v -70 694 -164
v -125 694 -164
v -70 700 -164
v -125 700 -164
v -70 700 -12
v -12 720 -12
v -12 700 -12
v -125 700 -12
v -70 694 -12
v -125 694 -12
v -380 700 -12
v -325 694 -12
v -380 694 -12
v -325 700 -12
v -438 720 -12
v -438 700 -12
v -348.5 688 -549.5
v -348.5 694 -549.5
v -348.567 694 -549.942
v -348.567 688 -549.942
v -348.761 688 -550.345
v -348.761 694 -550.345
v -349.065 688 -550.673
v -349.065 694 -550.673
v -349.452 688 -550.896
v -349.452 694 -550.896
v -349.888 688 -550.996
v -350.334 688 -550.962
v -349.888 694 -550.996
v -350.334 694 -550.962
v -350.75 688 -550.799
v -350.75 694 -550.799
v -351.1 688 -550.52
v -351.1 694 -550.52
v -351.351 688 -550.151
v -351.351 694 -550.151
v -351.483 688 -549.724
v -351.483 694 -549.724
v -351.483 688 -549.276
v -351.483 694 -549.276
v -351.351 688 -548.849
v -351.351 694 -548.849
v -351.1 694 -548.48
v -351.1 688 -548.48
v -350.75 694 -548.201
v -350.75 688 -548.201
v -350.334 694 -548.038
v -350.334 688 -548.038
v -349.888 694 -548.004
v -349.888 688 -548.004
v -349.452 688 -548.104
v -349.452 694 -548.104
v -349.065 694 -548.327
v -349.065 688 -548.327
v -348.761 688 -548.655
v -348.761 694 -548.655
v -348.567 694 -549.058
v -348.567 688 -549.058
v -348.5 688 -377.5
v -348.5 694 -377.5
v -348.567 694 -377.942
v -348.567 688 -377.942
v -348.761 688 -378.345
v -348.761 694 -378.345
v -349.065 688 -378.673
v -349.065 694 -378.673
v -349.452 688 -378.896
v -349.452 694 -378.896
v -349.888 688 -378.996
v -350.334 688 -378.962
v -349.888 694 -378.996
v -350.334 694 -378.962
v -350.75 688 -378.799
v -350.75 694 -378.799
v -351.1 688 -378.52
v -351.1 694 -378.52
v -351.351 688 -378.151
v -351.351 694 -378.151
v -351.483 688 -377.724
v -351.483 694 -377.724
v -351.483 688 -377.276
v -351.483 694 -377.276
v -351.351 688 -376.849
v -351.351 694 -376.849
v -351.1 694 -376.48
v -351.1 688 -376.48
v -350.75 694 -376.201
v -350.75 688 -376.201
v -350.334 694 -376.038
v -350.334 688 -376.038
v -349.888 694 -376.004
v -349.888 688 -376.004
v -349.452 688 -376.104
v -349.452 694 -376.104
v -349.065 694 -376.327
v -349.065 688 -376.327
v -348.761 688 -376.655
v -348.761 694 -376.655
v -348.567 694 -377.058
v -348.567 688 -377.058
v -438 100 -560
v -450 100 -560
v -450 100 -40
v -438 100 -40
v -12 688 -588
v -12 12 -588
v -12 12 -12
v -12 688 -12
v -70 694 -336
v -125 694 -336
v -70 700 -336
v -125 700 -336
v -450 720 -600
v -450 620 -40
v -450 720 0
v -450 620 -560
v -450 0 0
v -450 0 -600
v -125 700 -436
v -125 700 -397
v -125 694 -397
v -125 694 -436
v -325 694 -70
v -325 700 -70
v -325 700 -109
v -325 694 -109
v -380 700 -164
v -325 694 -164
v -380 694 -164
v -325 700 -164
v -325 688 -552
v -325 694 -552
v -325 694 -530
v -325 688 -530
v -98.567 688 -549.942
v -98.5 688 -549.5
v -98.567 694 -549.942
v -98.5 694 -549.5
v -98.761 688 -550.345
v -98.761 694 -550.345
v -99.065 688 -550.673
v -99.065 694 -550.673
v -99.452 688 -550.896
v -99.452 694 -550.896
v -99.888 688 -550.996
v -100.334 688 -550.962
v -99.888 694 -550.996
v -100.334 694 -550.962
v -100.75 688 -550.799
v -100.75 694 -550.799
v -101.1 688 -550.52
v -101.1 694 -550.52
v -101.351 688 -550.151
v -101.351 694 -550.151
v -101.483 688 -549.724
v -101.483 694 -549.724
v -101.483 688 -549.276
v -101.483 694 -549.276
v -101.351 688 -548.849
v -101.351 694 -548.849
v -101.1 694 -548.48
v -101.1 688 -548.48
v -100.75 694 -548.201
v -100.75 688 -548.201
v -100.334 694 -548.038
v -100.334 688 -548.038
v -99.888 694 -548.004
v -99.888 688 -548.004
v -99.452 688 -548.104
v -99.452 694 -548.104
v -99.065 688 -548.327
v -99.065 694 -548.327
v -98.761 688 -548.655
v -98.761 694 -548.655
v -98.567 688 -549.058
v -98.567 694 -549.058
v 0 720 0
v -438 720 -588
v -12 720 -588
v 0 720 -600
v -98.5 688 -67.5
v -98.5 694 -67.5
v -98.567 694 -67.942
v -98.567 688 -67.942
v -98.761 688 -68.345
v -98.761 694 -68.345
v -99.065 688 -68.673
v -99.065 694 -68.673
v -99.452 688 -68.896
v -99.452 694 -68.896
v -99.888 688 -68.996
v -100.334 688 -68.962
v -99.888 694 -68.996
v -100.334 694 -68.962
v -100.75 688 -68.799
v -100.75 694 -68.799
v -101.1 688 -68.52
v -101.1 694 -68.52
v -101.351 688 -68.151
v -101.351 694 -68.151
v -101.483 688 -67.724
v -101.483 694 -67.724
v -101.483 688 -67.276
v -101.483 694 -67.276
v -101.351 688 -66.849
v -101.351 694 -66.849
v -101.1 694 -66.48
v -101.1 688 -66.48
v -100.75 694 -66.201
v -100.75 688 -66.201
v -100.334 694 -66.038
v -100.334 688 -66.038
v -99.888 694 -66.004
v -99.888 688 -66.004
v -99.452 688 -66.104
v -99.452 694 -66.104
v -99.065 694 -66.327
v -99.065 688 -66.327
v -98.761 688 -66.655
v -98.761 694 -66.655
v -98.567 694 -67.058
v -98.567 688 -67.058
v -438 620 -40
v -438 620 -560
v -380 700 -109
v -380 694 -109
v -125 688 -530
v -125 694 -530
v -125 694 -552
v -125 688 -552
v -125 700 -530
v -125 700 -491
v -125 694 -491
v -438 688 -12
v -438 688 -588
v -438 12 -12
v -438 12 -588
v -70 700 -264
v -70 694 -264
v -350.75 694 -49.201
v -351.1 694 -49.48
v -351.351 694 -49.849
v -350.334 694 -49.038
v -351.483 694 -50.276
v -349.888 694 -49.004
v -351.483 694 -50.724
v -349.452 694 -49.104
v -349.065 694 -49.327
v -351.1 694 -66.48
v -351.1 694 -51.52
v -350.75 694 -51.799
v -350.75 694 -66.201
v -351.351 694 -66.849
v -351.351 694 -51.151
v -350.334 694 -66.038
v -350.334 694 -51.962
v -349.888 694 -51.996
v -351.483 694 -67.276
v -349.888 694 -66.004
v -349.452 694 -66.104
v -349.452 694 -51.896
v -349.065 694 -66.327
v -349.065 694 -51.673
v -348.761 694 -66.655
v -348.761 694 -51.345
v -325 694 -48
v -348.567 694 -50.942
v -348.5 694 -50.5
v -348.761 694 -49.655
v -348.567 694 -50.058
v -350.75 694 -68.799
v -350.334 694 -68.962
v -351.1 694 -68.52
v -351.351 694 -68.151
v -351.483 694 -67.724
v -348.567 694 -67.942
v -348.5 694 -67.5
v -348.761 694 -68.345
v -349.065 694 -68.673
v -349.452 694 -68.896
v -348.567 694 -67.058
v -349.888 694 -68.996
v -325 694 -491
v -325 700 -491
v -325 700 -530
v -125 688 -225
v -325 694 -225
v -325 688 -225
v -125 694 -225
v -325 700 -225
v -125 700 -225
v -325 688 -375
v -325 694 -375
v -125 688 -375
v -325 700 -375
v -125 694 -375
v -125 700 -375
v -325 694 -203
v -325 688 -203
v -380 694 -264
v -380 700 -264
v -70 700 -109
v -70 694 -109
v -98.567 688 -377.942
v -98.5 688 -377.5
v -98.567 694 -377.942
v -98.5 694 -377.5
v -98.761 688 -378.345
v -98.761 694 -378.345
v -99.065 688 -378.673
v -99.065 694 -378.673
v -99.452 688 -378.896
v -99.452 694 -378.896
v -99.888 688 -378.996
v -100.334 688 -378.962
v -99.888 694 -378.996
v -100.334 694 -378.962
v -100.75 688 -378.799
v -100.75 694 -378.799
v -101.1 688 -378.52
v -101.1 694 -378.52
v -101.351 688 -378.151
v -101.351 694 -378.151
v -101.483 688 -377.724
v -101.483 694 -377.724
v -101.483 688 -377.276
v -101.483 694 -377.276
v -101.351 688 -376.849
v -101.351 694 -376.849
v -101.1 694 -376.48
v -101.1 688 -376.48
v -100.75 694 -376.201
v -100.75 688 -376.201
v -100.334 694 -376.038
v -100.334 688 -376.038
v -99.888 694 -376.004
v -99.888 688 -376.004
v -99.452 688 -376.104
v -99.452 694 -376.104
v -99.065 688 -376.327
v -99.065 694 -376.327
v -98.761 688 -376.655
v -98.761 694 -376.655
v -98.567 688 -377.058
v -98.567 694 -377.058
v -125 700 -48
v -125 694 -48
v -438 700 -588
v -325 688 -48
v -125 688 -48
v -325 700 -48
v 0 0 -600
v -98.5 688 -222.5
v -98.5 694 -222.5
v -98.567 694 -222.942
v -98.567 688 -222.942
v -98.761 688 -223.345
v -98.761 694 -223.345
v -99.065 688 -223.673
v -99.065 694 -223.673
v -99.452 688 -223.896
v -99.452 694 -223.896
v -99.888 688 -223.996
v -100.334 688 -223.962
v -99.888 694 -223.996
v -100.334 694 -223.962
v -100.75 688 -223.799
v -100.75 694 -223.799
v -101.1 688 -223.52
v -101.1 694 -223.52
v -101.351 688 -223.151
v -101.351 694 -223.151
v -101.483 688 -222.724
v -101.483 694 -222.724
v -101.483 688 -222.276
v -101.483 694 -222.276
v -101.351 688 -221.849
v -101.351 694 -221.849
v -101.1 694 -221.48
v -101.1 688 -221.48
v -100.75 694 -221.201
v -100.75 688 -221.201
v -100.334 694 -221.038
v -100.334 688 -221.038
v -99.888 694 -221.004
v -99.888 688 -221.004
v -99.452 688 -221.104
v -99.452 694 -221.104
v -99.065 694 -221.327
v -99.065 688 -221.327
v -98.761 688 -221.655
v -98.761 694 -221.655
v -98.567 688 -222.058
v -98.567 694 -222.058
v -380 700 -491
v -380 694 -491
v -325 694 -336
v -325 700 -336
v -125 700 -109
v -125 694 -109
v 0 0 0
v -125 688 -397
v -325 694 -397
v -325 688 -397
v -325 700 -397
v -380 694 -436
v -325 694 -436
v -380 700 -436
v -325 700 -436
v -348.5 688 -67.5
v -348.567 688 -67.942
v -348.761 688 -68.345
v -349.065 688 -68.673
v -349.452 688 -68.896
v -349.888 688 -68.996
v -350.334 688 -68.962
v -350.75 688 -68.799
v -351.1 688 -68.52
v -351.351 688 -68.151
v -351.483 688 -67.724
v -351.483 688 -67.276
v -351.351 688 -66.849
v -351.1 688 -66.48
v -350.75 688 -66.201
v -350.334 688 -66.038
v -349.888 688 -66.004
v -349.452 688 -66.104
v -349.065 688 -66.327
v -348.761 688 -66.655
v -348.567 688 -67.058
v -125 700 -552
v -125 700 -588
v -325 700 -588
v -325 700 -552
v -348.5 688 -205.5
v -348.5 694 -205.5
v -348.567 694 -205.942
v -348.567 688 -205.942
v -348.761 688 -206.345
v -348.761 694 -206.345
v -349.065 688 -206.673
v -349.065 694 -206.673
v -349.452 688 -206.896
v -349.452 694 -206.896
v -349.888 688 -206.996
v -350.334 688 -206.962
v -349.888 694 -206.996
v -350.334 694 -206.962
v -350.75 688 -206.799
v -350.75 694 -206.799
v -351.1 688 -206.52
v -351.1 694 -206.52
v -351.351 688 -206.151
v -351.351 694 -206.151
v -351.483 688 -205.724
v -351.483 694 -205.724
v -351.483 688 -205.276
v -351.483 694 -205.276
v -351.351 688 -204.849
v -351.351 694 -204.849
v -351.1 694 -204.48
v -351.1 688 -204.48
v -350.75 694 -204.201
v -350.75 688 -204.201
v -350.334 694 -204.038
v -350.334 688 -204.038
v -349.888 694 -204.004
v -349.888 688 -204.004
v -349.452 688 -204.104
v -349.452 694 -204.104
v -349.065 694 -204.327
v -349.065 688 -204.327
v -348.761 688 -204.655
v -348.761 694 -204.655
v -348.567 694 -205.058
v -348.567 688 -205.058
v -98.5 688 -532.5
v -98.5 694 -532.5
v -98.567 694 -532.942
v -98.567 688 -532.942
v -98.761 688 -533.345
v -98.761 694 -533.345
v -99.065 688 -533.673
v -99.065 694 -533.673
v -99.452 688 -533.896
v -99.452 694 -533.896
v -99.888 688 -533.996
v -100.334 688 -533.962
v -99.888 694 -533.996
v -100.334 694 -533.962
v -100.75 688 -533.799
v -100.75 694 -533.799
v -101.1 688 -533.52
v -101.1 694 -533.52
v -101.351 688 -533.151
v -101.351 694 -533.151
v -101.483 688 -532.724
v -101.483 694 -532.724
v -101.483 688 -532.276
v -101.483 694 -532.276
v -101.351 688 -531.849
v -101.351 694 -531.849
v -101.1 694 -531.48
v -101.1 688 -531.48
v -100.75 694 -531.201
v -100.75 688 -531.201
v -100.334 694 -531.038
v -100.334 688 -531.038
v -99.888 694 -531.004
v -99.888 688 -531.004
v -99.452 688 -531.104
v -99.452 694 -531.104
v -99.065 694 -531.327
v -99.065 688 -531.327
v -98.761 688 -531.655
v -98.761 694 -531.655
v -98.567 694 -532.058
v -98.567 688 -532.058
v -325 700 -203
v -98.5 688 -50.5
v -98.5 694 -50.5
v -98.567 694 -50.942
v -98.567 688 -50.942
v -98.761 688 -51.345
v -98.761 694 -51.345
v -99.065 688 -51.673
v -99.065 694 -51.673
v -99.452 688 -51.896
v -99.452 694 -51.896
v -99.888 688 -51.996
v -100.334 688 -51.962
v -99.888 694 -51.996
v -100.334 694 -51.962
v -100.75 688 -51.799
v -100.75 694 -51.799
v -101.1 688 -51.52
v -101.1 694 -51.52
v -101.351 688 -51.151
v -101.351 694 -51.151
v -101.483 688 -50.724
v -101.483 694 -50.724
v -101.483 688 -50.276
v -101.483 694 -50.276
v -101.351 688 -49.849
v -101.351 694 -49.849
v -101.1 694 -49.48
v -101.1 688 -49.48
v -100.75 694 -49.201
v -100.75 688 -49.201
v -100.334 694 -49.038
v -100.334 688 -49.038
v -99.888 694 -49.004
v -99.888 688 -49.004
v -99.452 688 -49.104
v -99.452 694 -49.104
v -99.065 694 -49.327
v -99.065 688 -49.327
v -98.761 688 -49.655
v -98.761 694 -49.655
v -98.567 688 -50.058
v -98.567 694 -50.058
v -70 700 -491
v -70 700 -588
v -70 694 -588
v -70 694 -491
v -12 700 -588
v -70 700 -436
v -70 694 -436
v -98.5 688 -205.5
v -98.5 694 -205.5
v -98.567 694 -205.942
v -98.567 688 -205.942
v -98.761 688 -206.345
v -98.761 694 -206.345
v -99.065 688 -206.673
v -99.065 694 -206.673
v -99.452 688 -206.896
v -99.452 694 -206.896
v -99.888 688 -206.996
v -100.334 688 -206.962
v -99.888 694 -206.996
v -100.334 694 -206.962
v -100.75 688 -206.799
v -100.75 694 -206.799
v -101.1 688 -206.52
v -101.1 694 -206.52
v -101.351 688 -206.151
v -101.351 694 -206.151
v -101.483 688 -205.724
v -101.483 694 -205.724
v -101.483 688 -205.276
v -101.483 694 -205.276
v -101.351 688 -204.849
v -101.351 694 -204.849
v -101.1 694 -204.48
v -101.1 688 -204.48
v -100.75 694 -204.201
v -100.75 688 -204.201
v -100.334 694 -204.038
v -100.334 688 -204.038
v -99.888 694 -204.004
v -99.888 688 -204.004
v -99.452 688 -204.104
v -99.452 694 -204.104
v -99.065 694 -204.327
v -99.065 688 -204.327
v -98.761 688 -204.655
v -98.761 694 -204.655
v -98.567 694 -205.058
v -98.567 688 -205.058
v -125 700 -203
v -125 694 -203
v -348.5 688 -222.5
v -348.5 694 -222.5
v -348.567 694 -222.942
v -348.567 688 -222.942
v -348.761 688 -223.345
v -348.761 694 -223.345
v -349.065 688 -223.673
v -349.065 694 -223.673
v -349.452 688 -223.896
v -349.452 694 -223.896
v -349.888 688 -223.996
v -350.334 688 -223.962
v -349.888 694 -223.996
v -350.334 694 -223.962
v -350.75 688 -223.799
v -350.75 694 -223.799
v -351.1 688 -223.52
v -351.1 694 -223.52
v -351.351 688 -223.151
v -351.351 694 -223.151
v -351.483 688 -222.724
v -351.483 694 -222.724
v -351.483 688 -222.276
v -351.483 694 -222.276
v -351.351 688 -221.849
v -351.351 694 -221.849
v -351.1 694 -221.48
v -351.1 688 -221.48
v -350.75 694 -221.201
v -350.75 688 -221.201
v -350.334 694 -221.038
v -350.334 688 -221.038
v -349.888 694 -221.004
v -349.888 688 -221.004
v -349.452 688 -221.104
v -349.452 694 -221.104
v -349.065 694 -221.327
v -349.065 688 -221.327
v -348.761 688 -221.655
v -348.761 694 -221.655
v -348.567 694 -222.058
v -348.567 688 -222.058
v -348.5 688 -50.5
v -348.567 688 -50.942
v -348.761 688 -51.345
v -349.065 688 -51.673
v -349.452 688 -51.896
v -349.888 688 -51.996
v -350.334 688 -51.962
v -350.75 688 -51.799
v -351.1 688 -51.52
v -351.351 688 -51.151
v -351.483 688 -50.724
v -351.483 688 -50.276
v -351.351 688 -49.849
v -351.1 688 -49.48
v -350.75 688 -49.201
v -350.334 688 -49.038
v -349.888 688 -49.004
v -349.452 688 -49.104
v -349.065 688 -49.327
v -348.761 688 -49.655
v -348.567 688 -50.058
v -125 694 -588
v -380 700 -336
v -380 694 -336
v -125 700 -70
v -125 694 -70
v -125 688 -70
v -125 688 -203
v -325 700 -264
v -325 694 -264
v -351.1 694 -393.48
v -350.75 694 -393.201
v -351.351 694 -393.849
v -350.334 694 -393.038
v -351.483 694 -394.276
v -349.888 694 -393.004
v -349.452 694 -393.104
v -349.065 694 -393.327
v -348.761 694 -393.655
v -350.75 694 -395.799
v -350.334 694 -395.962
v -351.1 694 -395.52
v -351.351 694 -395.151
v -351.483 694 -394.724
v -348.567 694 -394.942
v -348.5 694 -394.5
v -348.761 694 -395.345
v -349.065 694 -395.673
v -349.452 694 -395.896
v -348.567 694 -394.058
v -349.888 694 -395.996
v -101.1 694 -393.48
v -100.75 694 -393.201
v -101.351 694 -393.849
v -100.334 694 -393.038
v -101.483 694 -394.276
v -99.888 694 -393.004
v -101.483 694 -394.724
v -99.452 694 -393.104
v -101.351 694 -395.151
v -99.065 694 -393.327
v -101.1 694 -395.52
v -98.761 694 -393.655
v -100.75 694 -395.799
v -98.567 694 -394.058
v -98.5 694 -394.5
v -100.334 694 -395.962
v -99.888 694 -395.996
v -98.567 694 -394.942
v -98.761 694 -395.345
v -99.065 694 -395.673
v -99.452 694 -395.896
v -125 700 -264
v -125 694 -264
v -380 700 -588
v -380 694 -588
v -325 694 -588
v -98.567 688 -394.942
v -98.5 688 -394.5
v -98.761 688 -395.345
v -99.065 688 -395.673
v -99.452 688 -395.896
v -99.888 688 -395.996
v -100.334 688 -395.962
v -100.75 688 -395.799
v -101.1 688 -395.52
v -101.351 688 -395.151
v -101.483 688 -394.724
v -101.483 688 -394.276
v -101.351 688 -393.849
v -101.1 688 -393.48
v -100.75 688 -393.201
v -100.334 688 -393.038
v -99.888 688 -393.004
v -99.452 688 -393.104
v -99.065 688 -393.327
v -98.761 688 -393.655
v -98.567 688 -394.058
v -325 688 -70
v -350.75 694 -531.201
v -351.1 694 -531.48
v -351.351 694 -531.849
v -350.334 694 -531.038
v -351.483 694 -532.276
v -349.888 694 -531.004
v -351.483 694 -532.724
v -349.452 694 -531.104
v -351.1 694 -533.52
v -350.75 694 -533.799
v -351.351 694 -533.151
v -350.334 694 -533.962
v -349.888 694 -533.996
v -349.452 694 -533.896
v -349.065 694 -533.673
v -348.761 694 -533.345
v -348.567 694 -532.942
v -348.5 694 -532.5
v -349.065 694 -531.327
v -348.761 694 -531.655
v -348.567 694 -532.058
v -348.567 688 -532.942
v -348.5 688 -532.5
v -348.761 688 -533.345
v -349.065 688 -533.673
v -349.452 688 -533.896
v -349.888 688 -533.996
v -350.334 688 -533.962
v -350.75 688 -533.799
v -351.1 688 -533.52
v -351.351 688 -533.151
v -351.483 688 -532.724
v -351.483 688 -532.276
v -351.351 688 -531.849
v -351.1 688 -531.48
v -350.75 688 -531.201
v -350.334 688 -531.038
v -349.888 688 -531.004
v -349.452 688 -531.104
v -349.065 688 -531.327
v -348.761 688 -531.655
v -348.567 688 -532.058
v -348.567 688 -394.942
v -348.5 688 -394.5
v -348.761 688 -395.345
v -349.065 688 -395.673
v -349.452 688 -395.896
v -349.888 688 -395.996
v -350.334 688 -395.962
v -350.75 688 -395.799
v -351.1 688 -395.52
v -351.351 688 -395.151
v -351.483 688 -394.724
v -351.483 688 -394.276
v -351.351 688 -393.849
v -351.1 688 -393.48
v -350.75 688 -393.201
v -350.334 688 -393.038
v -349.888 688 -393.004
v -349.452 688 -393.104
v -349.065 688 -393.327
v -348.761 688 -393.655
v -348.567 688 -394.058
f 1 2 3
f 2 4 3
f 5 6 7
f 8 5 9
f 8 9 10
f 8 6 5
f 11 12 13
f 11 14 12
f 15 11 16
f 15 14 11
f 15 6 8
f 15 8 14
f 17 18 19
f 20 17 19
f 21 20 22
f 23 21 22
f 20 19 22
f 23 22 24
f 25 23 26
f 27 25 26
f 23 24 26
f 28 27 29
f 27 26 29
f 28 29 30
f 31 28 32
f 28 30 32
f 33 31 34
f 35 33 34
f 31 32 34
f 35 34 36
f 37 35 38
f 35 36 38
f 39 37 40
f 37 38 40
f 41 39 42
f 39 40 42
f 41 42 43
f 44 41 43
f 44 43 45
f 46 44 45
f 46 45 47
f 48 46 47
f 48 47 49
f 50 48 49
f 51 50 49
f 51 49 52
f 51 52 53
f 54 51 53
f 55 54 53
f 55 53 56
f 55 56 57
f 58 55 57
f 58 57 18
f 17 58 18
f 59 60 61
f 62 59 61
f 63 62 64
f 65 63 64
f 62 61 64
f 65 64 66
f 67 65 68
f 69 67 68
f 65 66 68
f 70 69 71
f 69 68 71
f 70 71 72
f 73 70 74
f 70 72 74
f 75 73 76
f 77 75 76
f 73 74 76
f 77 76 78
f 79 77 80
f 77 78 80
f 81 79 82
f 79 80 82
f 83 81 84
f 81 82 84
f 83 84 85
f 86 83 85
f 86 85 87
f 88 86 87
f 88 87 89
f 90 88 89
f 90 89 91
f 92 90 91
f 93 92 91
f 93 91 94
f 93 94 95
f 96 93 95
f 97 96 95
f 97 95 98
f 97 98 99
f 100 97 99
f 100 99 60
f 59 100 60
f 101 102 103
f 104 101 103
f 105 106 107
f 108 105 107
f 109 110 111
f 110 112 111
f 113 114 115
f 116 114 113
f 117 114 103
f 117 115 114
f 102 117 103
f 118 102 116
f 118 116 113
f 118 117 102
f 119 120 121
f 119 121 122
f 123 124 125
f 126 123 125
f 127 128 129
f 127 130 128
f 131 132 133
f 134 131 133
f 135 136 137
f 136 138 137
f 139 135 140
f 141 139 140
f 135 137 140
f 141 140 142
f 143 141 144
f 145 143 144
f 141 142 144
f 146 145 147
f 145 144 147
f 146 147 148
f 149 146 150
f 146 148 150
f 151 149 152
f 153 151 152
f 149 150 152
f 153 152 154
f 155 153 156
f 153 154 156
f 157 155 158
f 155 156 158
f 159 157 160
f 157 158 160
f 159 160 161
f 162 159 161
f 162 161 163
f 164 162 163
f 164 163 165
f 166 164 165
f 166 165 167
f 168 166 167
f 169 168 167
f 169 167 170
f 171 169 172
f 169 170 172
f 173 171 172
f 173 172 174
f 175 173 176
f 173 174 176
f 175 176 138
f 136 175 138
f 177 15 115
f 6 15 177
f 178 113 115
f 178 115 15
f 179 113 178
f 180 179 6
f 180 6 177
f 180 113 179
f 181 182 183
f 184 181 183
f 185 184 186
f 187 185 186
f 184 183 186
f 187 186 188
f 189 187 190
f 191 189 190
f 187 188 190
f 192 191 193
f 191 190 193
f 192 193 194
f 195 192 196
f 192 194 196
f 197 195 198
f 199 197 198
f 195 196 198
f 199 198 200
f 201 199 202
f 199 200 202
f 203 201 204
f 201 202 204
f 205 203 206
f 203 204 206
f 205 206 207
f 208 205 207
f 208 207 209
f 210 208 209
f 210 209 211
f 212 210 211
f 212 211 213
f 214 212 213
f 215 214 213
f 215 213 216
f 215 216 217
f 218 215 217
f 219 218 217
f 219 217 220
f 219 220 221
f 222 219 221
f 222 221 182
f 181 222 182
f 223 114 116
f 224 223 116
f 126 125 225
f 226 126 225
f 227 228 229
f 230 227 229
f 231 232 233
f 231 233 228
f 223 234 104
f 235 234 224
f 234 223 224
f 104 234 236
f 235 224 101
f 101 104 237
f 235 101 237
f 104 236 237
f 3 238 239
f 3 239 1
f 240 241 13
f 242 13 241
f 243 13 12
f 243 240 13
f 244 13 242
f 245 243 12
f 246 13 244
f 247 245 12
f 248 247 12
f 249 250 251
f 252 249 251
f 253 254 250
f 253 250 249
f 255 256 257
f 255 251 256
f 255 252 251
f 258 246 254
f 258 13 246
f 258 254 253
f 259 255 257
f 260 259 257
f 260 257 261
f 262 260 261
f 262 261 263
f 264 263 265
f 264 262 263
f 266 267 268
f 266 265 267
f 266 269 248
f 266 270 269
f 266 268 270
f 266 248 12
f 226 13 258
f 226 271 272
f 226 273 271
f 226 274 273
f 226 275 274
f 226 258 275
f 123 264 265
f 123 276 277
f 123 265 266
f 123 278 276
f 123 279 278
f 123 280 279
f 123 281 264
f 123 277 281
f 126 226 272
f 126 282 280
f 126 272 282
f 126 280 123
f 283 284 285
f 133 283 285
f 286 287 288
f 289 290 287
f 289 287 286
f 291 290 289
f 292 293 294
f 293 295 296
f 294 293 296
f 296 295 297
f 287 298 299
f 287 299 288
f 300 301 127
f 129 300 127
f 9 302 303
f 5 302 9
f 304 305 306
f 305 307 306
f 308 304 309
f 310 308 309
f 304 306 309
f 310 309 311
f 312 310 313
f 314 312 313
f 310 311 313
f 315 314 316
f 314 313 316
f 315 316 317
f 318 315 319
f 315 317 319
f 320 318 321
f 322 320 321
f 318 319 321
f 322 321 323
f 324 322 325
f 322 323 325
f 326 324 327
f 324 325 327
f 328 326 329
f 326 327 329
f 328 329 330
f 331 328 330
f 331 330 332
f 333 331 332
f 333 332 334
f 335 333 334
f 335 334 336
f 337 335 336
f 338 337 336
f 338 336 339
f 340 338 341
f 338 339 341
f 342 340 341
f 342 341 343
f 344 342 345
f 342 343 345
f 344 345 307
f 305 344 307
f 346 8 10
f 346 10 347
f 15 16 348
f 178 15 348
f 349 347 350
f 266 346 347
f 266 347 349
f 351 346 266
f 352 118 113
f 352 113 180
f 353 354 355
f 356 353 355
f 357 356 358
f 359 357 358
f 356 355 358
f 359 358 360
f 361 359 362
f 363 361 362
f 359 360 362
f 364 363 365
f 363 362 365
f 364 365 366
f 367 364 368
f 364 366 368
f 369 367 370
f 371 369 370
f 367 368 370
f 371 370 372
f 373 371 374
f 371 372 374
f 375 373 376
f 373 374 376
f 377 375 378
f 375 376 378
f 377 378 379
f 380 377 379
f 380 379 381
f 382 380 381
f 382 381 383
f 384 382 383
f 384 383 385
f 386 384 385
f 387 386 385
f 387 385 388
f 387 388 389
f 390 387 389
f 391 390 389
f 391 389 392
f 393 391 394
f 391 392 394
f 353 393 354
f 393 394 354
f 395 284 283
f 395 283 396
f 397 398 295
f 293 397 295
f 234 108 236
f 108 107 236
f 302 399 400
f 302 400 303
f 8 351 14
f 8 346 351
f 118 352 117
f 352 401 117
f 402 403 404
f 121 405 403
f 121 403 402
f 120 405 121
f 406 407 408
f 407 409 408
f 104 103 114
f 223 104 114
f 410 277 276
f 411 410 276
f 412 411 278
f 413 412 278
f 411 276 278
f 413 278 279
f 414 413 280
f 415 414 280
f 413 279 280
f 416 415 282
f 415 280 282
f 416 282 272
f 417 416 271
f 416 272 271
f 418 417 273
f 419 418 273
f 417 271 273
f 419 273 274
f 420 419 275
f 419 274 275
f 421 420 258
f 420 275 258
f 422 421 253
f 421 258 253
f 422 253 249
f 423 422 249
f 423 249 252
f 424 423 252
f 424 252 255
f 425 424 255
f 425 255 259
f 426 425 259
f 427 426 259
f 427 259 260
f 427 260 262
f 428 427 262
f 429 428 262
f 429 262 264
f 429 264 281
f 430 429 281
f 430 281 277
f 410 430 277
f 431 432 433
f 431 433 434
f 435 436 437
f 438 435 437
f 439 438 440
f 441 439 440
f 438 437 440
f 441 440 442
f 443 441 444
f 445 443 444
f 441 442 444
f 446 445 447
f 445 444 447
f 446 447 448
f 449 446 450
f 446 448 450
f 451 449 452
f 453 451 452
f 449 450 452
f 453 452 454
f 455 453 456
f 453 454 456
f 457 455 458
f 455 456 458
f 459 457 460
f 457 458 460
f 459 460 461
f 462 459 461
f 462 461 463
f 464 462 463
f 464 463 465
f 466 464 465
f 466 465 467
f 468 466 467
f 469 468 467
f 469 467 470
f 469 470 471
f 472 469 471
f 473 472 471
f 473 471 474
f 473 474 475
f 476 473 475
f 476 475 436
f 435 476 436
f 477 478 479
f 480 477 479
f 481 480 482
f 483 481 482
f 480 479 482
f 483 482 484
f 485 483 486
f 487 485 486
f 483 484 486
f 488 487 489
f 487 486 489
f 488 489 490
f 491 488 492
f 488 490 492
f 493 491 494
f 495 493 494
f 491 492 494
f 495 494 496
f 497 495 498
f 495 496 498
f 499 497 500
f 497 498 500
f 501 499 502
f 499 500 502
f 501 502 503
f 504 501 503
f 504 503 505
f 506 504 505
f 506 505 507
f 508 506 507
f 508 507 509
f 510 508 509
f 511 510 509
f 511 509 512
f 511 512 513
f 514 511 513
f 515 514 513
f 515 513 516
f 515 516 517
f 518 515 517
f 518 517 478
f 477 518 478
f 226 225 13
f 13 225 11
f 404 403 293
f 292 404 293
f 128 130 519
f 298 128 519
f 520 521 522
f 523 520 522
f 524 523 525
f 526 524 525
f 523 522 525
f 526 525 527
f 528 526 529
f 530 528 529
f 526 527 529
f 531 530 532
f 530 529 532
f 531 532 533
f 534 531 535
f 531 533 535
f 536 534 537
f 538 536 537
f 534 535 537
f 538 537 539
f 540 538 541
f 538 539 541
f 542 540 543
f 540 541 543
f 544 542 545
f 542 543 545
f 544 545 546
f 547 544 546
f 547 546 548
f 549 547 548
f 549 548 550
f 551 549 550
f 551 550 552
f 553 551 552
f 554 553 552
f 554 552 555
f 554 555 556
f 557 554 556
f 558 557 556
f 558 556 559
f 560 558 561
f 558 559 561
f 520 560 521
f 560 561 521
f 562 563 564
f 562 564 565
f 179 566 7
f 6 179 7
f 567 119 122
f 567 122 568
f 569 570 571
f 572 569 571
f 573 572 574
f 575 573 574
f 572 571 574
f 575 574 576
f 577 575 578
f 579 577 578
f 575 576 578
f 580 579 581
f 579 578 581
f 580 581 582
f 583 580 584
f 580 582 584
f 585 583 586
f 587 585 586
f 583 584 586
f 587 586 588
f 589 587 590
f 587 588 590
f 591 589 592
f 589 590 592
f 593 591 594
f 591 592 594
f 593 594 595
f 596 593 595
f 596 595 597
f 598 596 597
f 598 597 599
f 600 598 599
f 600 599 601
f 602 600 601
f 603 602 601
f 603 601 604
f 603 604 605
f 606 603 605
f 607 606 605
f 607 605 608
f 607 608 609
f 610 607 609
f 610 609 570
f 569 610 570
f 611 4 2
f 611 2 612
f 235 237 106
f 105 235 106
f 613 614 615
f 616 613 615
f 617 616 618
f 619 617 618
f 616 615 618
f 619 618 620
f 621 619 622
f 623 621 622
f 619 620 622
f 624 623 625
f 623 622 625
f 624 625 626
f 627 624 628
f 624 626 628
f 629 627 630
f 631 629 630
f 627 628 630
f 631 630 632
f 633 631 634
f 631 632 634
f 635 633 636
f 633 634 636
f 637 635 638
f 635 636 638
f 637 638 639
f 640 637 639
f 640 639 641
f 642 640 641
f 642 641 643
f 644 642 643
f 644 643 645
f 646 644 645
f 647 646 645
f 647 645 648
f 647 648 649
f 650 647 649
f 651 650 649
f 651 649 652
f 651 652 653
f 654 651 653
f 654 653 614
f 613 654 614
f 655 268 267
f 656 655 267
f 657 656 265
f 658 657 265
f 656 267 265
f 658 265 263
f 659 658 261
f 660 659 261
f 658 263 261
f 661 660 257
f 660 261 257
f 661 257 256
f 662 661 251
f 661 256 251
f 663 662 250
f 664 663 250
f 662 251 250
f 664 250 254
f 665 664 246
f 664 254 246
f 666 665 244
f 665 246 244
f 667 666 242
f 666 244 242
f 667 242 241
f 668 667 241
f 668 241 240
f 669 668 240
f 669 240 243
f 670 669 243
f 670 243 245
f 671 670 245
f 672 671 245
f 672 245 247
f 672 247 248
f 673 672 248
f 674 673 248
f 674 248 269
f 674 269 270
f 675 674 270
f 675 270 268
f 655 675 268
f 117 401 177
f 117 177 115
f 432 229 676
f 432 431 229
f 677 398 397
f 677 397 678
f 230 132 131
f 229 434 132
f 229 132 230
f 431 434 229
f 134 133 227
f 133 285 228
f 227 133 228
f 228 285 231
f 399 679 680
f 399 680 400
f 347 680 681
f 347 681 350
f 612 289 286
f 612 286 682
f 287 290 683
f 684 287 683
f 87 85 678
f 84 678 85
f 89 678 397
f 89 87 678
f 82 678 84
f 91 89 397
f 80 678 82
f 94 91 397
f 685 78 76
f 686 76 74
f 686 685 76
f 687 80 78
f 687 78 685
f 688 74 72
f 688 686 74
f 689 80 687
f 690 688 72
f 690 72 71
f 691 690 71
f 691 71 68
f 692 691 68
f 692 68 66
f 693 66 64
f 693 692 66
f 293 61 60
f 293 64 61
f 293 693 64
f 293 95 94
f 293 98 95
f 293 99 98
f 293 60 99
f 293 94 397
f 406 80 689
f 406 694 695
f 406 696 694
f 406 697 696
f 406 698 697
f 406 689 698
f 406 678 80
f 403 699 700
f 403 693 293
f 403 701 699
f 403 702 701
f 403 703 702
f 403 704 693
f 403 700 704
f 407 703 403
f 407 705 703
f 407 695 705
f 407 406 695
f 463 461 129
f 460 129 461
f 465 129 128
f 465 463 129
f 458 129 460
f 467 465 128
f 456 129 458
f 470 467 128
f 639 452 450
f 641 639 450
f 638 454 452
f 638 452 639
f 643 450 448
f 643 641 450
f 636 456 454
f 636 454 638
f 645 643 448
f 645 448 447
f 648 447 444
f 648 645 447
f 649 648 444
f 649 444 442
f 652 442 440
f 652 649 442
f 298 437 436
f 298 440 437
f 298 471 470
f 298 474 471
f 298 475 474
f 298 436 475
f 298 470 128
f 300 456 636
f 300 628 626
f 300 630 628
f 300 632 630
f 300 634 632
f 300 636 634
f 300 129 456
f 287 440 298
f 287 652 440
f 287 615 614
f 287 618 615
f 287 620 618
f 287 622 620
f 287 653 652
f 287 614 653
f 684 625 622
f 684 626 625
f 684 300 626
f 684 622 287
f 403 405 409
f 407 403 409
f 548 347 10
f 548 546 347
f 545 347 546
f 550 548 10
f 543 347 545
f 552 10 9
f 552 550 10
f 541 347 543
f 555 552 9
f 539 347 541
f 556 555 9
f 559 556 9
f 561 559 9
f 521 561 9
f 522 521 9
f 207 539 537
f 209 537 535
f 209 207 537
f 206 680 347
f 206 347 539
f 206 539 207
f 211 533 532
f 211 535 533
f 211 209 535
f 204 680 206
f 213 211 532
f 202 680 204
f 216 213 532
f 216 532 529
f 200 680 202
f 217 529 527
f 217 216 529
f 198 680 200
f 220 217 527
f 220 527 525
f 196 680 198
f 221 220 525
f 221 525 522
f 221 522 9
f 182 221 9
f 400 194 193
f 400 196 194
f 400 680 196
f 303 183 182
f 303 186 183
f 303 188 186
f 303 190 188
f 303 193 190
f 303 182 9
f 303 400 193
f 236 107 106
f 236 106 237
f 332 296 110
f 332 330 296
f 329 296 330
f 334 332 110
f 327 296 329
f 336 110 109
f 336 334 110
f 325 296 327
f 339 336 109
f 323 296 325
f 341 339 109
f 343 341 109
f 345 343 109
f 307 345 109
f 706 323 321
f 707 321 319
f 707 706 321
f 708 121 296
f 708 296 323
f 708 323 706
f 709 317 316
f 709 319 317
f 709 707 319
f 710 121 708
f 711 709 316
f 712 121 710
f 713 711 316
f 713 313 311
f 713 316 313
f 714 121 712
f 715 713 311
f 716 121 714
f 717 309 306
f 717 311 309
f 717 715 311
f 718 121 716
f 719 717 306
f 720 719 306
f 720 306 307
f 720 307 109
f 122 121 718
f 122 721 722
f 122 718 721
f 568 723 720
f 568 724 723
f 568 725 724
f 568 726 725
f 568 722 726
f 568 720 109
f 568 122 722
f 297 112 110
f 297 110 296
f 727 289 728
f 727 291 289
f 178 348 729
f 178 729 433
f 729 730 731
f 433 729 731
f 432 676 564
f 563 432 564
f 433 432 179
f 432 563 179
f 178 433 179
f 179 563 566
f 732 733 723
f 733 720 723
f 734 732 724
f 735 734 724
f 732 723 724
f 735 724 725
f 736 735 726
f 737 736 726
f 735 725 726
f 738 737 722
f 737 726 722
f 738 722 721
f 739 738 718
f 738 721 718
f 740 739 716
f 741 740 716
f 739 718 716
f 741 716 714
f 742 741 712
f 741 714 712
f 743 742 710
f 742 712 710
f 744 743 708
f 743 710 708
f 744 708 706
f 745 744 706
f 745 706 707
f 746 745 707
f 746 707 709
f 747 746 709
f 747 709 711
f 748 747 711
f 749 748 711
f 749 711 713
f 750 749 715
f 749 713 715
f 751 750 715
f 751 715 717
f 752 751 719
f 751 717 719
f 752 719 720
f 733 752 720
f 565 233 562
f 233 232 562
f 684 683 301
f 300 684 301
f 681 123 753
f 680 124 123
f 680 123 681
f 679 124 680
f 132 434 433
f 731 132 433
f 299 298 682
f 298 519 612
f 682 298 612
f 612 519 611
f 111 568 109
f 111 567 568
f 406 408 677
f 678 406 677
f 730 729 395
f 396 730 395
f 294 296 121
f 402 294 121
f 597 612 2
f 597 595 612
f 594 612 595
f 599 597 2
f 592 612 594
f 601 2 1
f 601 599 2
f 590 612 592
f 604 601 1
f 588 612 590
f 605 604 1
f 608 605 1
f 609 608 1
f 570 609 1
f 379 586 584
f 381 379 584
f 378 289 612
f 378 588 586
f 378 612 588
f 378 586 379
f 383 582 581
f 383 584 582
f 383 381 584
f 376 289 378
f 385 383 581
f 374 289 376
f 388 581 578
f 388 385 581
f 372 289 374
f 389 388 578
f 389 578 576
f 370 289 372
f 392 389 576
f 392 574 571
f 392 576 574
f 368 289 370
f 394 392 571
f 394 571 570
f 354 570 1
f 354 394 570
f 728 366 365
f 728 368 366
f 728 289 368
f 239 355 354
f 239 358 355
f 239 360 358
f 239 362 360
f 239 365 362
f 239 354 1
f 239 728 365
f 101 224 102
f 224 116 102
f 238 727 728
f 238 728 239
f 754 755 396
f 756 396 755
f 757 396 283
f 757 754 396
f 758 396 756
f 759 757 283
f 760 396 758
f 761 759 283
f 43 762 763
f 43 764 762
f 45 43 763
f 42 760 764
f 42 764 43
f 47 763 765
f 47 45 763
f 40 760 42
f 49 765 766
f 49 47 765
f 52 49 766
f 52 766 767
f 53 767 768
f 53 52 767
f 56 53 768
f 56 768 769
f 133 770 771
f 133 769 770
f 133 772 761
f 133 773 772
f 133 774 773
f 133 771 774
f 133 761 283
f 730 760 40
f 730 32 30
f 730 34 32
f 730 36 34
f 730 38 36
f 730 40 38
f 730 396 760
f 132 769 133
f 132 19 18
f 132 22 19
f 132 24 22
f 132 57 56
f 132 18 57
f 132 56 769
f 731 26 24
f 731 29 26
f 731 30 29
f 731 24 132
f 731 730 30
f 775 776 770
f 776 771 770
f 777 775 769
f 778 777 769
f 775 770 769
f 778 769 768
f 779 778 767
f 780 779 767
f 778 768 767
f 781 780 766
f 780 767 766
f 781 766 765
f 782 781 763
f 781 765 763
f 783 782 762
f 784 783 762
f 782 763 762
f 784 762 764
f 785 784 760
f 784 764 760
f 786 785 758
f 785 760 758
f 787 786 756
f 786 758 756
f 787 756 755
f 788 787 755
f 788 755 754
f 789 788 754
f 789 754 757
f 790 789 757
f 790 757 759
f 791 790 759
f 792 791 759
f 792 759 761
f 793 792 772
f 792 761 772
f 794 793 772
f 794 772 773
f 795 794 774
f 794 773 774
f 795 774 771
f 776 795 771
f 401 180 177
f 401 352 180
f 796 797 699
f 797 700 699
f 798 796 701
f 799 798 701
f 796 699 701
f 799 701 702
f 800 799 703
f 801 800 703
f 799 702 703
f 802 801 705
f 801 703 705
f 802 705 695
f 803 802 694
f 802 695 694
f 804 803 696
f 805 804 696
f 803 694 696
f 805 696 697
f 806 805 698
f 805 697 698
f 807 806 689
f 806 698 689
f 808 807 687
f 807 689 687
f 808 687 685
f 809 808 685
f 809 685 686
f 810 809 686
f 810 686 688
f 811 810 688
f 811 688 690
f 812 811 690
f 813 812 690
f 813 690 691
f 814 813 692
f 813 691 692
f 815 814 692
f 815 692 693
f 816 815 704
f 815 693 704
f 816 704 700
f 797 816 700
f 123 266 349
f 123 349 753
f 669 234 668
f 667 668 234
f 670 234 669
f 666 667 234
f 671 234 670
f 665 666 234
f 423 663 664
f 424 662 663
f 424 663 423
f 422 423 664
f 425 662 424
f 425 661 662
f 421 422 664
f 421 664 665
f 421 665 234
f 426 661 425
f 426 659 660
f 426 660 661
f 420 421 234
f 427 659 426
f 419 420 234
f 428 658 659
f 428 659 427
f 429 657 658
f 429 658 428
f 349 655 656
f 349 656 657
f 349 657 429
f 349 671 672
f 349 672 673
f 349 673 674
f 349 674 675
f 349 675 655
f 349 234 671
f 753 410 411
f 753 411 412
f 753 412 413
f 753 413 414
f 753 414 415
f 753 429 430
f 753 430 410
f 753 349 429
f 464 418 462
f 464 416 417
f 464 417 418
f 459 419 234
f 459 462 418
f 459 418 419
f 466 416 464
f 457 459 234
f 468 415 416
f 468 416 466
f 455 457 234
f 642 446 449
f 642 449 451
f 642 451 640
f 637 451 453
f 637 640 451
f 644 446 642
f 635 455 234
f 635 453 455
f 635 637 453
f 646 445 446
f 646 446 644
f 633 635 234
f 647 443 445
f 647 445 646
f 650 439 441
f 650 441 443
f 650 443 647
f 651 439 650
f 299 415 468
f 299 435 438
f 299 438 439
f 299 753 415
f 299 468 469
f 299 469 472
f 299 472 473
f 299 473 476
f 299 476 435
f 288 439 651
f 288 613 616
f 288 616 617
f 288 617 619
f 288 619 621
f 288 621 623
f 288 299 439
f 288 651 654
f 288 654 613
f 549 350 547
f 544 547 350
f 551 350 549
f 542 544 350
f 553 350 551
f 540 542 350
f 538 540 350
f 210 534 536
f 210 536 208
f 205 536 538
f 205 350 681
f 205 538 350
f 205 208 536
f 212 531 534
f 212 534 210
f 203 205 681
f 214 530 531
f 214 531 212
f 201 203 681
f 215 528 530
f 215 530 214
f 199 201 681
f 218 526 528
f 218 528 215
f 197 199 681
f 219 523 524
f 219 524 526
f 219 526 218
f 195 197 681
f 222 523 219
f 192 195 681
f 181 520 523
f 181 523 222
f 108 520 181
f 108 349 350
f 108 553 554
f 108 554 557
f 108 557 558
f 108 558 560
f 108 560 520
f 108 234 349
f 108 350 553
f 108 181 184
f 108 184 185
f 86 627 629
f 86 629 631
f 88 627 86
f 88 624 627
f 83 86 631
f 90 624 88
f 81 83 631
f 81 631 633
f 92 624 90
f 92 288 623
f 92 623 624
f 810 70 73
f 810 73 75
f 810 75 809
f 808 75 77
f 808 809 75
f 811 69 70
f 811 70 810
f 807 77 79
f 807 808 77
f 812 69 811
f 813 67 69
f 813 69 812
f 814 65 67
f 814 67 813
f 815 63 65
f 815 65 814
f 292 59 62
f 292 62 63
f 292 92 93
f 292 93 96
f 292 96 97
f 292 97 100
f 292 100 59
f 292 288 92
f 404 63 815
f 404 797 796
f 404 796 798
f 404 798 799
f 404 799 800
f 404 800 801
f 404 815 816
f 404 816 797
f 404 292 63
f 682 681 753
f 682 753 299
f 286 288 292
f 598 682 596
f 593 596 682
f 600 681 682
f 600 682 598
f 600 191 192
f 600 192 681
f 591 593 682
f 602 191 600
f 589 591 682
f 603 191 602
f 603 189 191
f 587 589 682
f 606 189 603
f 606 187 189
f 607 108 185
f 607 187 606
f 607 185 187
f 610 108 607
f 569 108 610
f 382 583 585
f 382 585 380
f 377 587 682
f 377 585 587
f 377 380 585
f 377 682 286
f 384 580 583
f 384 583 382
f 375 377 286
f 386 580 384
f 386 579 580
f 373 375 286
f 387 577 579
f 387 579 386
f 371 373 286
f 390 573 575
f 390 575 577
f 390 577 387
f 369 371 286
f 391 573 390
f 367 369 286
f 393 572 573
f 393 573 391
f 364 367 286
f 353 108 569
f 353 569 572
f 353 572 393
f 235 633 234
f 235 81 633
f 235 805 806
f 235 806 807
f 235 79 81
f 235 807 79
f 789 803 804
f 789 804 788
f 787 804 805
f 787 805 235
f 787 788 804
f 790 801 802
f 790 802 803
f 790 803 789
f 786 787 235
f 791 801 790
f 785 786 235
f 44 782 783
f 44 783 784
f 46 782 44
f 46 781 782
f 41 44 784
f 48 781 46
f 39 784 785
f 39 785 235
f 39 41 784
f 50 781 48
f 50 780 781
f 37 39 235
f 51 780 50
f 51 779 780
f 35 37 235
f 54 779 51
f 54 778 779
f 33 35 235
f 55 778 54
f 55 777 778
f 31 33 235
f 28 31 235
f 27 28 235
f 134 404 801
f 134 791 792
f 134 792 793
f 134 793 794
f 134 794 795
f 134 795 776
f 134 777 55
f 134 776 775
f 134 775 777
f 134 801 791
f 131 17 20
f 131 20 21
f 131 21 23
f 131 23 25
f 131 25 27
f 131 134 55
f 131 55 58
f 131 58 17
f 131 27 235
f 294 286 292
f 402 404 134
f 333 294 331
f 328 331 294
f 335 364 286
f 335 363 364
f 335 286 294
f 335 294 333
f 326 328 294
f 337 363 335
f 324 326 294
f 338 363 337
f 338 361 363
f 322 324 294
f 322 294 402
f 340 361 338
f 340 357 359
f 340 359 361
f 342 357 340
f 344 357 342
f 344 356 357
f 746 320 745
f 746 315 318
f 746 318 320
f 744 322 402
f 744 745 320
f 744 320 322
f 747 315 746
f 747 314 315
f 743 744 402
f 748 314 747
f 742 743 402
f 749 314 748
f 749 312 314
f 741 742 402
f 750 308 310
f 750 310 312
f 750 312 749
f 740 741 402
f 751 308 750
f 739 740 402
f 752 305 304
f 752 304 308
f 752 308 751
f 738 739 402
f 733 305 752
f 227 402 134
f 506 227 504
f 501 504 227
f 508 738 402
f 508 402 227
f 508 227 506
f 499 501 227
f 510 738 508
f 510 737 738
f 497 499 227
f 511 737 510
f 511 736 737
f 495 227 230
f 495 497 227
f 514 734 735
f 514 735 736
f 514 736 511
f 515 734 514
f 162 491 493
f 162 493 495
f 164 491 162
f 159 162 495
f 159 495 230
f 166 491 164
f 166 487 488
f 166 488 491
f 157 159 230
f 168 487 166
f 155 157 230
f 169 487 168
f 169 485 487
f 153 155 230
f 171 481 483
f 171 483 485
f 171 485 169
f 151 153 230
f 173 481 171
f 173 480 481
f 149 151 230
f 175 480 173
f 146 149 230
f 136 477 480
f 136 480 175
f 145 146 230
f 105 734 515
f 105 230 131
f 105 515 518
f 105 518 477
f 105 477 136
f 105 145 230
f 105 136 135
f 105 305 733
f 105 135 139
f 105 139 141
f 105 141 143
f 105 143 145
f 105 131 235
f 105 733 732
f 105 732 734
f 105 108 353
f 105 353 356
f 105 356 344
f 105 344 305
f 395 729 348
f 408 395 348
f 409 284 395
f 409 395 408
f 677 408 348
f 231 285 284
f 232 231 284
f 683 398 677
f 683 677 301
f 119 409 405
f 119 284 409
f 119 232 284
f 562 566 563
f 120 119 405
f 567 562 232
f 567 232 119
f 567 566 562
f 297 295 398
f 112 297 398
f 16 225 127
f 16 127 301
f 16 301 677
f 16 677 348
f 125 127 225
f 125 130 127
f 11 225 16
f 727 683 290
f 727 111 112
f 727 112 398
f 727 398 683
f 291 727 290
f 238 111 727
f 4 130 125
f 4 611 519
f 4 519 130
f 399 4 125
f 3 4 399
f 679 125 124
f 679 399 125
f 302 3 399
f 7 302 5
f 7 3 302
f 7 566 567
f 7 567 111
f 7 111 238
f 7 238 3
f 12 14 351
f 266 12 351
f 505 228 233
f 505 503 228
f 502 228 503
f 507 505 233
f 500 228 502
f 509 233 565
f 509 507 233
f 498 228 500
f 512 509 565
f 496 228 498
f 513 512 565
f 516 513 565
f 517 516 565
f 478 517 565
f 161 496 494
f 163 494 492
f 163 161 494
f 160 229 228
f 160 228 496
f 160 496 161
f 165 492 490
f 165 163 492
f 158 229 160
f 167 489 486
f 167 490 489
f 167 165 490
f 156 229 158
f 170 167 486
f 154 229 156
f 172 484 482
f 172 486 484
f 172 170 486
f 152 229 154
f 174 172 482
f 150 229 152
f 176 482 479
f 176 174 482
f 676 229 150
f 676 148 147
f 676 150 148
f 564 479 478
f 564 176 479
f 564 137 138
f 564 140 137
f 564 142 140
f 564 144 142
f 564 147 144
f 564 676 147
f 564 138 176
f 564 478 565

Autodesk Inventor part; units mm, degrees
ref_plane "YZ Plane" through (0, 0, 0) normal (1, 0, 0) x (0, 1, 0)
ref_plane "XZ Plane" through (0, 0, 0) normal (0, 1, 0) x (-1, 0, 0)
ref_plane "XY Plane" through (0, 0, 0) normal (0, 0, 1) x (1, 0, 0)
sketch "Sketch1" plane through (0, 0, 0) normal (0, 1, 0) x (-1, 0, 0)
  line L0 (0, 0) -> (450, 0)
  line L1 (450, 0) -> (450, -600)
  line L2 (450, -600) -> (0, -600)
  line L3 (0, -600) -> (0, 0)
  dimension "d0" = 450
  dimension "d1" = 600
extrude "Extrusion1" add sketch "Sketch1" along normal blind 12
sketch "Sketch2" plane through (0, 12, 0) normal (0, 1, 0) x (1, 0, 0)
  line L0 (0, 0) -> (0, 600) projected
  line L1 (-450, 600) -> (-450, 0) projected
  line L2 (0, 600) -> (-450, 600)
  line L3 (-450, 600) -> (-450, 0)
  line L4 (-450, 0) -> (0, 0)
  line L5 (0, 0) -> (0, 600)
  line L6 (-438, 588) -> (-12, 588)
  line L7 (-12, 588) -> (-12, 12)
  line L8 (-12, 12) -> (-438, 12)
  line L9 (-438, 12) -> (-438, 588)
  dimension "d4" = 12
extrude "Extrusion2" add sketch "Sketch2" along normal blind 708
sketch "Sketch3" plane through (-450, 0, -600) normal (-1, 0, 0) x (0, 0, 1)
  line L0 (0, 0) -> (40, 0)
  line L1 (40, 0) -> (40, 100)
  line L2 (40, 100) -> (0, 100)
  line L3 (0, 100) -> (0, 0)
  line L4 (600, 0) -> (560, 0)
  line L5 (560, 0) -> (560, 100)
  line L6 (560, 100) -> (600, 100)
  line L7 (600, 100) -> (600, 0)
  line L8 (600, 720) -> (560, 720)
  line L9 (560, 720) -> (560, 620)
  line L10 (560, 620) -> (600, 620)
  line L11 (600, 620) -> (600, 720)
  line L12 (40, 100) -> (560, 100)
  line L13 (560, 100) -> (560, 620)
  line L14 (560, 620) -> (40, 620)
  line L15 (40, 620) -> (40, 100)
  dimension "d7" = 40
  dimension "d8" = 100
  dimension "d9" = 40
  dimension "d10" = 100
  dimension "d11" = 40
  dimension "d12" = 100
extrude "Extrusion3" cut sketch "Sketch3" against normal blind 12 contours L15 L14 L13 L12
sketch "Sketch4" plane through (-12, 12, -588) normal (-1, 0, 0) x (0, 0, 1)
  point P0 (588, -12)
sketch "Sketch5" plane through (-12, 12, -588) normal (-1, 0, 0) x (0, 0, 1)
  line L0 (0, 0) -> (0, 708) projected
  line L1 (0, 708) -> (0, 688)
  line L2 (576, 0) -> (576, 708) projected
  line L3 (0, 688) -> (576, 688)
  line L4 (576, 688) -> (576, 676)
  line L5 (576, 676) -> (0, 676)
  line L6 (0, 676) -> (0, 688)
  point P0 (588, -12)
  dimension "d15" = 20
  dimension "d16" = 12
extrude "Extrusion4" add sketch "Sketch5" along normal up to surface (438 mm away)
sketch "Sketch6" plane through (-12, 700, -12) normal (0, 1, 0) x (1, 0, 0)
  line L0 (-426, 576) -> (0, 576) projected
  line L1 (-213, 576) -> (-213, 0)
  line L2 (0, 0) -> (-426, 0) projected
  line L3 (-213, 576) -> (-213, 504)
  line L4 (-213, 504) -> (-213, 515)
  line L5 (-213, 515) -> (-113, 515)
  line L6 (-213, 540) -> (-113, 540)
  line L7 (-113, 540) -> (-313, 540)
  line L8 (-313, 540) -> (-313, 518)
  line L9 (-313, 518) -> (-113, 518)
  line L10 (-113, 518) -> (-113, 540)
  line L11 (-213, 529) -> (-338, 529)
  line L12 (-338, 529) -> (-338, 537.5)
  circle A0 centre (-338, 537.5) radius 1.5
  line L13 (-338, 537.5) -> (-338, 520.5)
  circle A1 centre (-338, 520.5) radius 1.5
  circle A2 centre (-88, 537.5) radius 1.5
  circle A3 centre (-88, 520.5) radius 1.5
  line L14 (-213, 518) -> (-213, 374)
  line L15 (-213, 374) -> (-213, 385)
  line L16 (-213, 385) -> (-113, 385)
  line L17 (-113, 385) -> (-313, 385)
  line L18 (-313, 385) -> (-313, 363)
  line L19 (-313, 363) -> (-113, 363)
  line L20 (-113, 363) -> (-113, 385)
  line L21 (-88, 537.5) -> (-88, 520.5)
  line L22 (-113, 374) -> (-88, 374)
  line L23 (-88, 374) -> (-88, 382.5)
  line L24 (-88, 382.5) -> (-88, 365.5)
  circle A4 centre (-88, 382.5) radius 1.5
  circle A5 centre (-88, 365.5) radius 1.5
  circle A6 centre (-338, 382.5) radius 1.5
  circle A7 centre (-338, 365.5) radius 1.5
  line L25 (-213, 288) -> (-149.1067, 288)
  line L26 (-113, 36) -> (-313, 36)
  line L27 (-313, 36) -> (-313, 58)
  line L28 (-313, 58) -> (-113, 58)
  line L29 (-113, 58) -> (-113, 36)
  circle A8 centre (-338, 38.5) radius 1.5
  circle A9 centre (-338, 55.5) radius 1.5
  circle A10 centre (-88, 38.5) radius 1.5
  circle A11 centre (-88, 55.5) radius 1.5
  line L30 (-213, 191) -> (-113, 191)
  line L31 (-113, 191) -> (-313, 191)
  line L32 (-313, 191) -> (-313, 213)
  line L33 (-313, 213) -> (-113, 213)
  line L34 (-113, 213) -> (-113, 191)
  circle A12 centre (-88, 193.5) radius 1.5
  circle A13 centre (-88, 210.5) radius 1.5
  circle A14 centre (-338, 193.5) radius 1.5
  circle A15 centre (-338, 210.5) radius 1.5
  point P0 (12, -12)
  point P1 (-113, 202)
  dimension "d19" = 72
  dimension "d20" = 11
  dimension "d21" = 100
  dimension "d22" = 200
  dimension "d23" = 22
  dimension "d24" = 125
  dimension "d25" = 8.5
  dimension "d26" = 3
  dimension "d27" = 17
  dimension "d28" = 3
  dimension "d29" = 144
  dimension "d30" = 11
  dimension "d31" = 100
  dimension "d32" = 22
  dimension "d33" = 25
  dimension "d34" = 8.5
  dimension "d35" = 17
extrude "Extrusion5" cut sketch "Sketch6" against normal blind 12
sketch "Sketch7" plane through (-12, 700, -12) normal (0, 1, 0) x (1, 0, 0)
  point P0 (12, -12)
sketch "Sketch8" plane through (-12, 700, -12) normal (0, 1, 0) x (1, 0, 0)
  line L0 (-313, 36) -> (-113, 36) projected
  line L1 (0, 0) -> (-426, 0) projected
  line L2 (-113, 36) -> (-58, 36)
  line L3 (-58, 36) -> (-58, 0)
  line L4 (-58, 0) -> (-113, 0)
  line L5 (-113, 0) -> (-113, 36)
  line L6 (0, 576) -> (-426, 576) projected
  line L7 (-58, 0) -> (-113, 0)
  line L8 (-113, 0) -> (-113, 576)
  line L9 (-113, 576) -> (-58, 576)
  line L10 (-58, 576) -> (-58, 0)
  line L11 (-213, 576) -> (-213, 492.9695)
  line L12 (-426, 0) -> (0, 0)
  line L13 (-368, 0) -> (-313, 0)
  line L14 (-426, 576) -> (0, 576)
  line L15 (-313, 0) -> (-313, 576)
  line L16 (-313, 576) -> (-368, 576)
  line L17 (-368, 576) -> (-368, 0)
  line L18 (-313, 518) -> (-113, 518) projected
  line L19 (-313, 540) -> (-113, 540) projected
  line L20 (-313, 518) -> (-313, 540)
  line L21 (-113, 213) -> (-313, 213) projected
  line L22 (-313, 191) -> (-113, 191) projected
  line L23 (-313, 213) -> (-313, 191)
  line L24 (-313, 202) -> (-313, 152)
  line L25 (-313, 152) -> (-313, 252)
  line L26 (-313, 252) -> (-368, 252)
  line L27 (-313, 152) -> (-368, 152)
  line L28 (-113, 385) -> (-313, 385) projected
  line L29 (-313, 191) -> (-313, 385)
  line L30 (-313, 288) -> (-113, 288)
  line L31 (-313, 324) -> (-368, 324)
  line L32 (-313, 424) -> (-368, 424)
  line L33 (-113, 252) -> (-58, 252)
  line L34 (-113, 152) -> (-58, 152)
  line L35 (-113, 424) -> (-58, 424)
  line L36 (-113, 324) -> (-58, 324)
  line L37 (-113, 58) -> (-313, 58) projected
  line L38 (-313, 58) -> (-313, 36)
  line L39 (-313, 47) -> (-313, 97)
  line L40 (-313, 97) -> (-368, 97)
  line L41 (-313, 479) -> (-368, 479)
  line L42 (-113, 97) -> (-58, 97)
  line L43 (-113, 479) -> (-58, 479)
  point P0 (12, -12)
  dimension "d38" = 55
  dimension "d39" = 50
  dimension "d40" = 100
  dimension "d41" = 50
extrude "Extrusion6" cut sketch "Sketch8" against normal blind 6 contours L15 L1 L17 L40 | L8 L42 L10 L2 | L2 L3 L1 L5 | L34 L8 L33 L10 | L17 L26 L15 L27 | L36 L8 L35 L10 | L17 L32 L15 L31 | L43 L8 L6 L10 | L17 L6 L15 L41
properties part number "box"
